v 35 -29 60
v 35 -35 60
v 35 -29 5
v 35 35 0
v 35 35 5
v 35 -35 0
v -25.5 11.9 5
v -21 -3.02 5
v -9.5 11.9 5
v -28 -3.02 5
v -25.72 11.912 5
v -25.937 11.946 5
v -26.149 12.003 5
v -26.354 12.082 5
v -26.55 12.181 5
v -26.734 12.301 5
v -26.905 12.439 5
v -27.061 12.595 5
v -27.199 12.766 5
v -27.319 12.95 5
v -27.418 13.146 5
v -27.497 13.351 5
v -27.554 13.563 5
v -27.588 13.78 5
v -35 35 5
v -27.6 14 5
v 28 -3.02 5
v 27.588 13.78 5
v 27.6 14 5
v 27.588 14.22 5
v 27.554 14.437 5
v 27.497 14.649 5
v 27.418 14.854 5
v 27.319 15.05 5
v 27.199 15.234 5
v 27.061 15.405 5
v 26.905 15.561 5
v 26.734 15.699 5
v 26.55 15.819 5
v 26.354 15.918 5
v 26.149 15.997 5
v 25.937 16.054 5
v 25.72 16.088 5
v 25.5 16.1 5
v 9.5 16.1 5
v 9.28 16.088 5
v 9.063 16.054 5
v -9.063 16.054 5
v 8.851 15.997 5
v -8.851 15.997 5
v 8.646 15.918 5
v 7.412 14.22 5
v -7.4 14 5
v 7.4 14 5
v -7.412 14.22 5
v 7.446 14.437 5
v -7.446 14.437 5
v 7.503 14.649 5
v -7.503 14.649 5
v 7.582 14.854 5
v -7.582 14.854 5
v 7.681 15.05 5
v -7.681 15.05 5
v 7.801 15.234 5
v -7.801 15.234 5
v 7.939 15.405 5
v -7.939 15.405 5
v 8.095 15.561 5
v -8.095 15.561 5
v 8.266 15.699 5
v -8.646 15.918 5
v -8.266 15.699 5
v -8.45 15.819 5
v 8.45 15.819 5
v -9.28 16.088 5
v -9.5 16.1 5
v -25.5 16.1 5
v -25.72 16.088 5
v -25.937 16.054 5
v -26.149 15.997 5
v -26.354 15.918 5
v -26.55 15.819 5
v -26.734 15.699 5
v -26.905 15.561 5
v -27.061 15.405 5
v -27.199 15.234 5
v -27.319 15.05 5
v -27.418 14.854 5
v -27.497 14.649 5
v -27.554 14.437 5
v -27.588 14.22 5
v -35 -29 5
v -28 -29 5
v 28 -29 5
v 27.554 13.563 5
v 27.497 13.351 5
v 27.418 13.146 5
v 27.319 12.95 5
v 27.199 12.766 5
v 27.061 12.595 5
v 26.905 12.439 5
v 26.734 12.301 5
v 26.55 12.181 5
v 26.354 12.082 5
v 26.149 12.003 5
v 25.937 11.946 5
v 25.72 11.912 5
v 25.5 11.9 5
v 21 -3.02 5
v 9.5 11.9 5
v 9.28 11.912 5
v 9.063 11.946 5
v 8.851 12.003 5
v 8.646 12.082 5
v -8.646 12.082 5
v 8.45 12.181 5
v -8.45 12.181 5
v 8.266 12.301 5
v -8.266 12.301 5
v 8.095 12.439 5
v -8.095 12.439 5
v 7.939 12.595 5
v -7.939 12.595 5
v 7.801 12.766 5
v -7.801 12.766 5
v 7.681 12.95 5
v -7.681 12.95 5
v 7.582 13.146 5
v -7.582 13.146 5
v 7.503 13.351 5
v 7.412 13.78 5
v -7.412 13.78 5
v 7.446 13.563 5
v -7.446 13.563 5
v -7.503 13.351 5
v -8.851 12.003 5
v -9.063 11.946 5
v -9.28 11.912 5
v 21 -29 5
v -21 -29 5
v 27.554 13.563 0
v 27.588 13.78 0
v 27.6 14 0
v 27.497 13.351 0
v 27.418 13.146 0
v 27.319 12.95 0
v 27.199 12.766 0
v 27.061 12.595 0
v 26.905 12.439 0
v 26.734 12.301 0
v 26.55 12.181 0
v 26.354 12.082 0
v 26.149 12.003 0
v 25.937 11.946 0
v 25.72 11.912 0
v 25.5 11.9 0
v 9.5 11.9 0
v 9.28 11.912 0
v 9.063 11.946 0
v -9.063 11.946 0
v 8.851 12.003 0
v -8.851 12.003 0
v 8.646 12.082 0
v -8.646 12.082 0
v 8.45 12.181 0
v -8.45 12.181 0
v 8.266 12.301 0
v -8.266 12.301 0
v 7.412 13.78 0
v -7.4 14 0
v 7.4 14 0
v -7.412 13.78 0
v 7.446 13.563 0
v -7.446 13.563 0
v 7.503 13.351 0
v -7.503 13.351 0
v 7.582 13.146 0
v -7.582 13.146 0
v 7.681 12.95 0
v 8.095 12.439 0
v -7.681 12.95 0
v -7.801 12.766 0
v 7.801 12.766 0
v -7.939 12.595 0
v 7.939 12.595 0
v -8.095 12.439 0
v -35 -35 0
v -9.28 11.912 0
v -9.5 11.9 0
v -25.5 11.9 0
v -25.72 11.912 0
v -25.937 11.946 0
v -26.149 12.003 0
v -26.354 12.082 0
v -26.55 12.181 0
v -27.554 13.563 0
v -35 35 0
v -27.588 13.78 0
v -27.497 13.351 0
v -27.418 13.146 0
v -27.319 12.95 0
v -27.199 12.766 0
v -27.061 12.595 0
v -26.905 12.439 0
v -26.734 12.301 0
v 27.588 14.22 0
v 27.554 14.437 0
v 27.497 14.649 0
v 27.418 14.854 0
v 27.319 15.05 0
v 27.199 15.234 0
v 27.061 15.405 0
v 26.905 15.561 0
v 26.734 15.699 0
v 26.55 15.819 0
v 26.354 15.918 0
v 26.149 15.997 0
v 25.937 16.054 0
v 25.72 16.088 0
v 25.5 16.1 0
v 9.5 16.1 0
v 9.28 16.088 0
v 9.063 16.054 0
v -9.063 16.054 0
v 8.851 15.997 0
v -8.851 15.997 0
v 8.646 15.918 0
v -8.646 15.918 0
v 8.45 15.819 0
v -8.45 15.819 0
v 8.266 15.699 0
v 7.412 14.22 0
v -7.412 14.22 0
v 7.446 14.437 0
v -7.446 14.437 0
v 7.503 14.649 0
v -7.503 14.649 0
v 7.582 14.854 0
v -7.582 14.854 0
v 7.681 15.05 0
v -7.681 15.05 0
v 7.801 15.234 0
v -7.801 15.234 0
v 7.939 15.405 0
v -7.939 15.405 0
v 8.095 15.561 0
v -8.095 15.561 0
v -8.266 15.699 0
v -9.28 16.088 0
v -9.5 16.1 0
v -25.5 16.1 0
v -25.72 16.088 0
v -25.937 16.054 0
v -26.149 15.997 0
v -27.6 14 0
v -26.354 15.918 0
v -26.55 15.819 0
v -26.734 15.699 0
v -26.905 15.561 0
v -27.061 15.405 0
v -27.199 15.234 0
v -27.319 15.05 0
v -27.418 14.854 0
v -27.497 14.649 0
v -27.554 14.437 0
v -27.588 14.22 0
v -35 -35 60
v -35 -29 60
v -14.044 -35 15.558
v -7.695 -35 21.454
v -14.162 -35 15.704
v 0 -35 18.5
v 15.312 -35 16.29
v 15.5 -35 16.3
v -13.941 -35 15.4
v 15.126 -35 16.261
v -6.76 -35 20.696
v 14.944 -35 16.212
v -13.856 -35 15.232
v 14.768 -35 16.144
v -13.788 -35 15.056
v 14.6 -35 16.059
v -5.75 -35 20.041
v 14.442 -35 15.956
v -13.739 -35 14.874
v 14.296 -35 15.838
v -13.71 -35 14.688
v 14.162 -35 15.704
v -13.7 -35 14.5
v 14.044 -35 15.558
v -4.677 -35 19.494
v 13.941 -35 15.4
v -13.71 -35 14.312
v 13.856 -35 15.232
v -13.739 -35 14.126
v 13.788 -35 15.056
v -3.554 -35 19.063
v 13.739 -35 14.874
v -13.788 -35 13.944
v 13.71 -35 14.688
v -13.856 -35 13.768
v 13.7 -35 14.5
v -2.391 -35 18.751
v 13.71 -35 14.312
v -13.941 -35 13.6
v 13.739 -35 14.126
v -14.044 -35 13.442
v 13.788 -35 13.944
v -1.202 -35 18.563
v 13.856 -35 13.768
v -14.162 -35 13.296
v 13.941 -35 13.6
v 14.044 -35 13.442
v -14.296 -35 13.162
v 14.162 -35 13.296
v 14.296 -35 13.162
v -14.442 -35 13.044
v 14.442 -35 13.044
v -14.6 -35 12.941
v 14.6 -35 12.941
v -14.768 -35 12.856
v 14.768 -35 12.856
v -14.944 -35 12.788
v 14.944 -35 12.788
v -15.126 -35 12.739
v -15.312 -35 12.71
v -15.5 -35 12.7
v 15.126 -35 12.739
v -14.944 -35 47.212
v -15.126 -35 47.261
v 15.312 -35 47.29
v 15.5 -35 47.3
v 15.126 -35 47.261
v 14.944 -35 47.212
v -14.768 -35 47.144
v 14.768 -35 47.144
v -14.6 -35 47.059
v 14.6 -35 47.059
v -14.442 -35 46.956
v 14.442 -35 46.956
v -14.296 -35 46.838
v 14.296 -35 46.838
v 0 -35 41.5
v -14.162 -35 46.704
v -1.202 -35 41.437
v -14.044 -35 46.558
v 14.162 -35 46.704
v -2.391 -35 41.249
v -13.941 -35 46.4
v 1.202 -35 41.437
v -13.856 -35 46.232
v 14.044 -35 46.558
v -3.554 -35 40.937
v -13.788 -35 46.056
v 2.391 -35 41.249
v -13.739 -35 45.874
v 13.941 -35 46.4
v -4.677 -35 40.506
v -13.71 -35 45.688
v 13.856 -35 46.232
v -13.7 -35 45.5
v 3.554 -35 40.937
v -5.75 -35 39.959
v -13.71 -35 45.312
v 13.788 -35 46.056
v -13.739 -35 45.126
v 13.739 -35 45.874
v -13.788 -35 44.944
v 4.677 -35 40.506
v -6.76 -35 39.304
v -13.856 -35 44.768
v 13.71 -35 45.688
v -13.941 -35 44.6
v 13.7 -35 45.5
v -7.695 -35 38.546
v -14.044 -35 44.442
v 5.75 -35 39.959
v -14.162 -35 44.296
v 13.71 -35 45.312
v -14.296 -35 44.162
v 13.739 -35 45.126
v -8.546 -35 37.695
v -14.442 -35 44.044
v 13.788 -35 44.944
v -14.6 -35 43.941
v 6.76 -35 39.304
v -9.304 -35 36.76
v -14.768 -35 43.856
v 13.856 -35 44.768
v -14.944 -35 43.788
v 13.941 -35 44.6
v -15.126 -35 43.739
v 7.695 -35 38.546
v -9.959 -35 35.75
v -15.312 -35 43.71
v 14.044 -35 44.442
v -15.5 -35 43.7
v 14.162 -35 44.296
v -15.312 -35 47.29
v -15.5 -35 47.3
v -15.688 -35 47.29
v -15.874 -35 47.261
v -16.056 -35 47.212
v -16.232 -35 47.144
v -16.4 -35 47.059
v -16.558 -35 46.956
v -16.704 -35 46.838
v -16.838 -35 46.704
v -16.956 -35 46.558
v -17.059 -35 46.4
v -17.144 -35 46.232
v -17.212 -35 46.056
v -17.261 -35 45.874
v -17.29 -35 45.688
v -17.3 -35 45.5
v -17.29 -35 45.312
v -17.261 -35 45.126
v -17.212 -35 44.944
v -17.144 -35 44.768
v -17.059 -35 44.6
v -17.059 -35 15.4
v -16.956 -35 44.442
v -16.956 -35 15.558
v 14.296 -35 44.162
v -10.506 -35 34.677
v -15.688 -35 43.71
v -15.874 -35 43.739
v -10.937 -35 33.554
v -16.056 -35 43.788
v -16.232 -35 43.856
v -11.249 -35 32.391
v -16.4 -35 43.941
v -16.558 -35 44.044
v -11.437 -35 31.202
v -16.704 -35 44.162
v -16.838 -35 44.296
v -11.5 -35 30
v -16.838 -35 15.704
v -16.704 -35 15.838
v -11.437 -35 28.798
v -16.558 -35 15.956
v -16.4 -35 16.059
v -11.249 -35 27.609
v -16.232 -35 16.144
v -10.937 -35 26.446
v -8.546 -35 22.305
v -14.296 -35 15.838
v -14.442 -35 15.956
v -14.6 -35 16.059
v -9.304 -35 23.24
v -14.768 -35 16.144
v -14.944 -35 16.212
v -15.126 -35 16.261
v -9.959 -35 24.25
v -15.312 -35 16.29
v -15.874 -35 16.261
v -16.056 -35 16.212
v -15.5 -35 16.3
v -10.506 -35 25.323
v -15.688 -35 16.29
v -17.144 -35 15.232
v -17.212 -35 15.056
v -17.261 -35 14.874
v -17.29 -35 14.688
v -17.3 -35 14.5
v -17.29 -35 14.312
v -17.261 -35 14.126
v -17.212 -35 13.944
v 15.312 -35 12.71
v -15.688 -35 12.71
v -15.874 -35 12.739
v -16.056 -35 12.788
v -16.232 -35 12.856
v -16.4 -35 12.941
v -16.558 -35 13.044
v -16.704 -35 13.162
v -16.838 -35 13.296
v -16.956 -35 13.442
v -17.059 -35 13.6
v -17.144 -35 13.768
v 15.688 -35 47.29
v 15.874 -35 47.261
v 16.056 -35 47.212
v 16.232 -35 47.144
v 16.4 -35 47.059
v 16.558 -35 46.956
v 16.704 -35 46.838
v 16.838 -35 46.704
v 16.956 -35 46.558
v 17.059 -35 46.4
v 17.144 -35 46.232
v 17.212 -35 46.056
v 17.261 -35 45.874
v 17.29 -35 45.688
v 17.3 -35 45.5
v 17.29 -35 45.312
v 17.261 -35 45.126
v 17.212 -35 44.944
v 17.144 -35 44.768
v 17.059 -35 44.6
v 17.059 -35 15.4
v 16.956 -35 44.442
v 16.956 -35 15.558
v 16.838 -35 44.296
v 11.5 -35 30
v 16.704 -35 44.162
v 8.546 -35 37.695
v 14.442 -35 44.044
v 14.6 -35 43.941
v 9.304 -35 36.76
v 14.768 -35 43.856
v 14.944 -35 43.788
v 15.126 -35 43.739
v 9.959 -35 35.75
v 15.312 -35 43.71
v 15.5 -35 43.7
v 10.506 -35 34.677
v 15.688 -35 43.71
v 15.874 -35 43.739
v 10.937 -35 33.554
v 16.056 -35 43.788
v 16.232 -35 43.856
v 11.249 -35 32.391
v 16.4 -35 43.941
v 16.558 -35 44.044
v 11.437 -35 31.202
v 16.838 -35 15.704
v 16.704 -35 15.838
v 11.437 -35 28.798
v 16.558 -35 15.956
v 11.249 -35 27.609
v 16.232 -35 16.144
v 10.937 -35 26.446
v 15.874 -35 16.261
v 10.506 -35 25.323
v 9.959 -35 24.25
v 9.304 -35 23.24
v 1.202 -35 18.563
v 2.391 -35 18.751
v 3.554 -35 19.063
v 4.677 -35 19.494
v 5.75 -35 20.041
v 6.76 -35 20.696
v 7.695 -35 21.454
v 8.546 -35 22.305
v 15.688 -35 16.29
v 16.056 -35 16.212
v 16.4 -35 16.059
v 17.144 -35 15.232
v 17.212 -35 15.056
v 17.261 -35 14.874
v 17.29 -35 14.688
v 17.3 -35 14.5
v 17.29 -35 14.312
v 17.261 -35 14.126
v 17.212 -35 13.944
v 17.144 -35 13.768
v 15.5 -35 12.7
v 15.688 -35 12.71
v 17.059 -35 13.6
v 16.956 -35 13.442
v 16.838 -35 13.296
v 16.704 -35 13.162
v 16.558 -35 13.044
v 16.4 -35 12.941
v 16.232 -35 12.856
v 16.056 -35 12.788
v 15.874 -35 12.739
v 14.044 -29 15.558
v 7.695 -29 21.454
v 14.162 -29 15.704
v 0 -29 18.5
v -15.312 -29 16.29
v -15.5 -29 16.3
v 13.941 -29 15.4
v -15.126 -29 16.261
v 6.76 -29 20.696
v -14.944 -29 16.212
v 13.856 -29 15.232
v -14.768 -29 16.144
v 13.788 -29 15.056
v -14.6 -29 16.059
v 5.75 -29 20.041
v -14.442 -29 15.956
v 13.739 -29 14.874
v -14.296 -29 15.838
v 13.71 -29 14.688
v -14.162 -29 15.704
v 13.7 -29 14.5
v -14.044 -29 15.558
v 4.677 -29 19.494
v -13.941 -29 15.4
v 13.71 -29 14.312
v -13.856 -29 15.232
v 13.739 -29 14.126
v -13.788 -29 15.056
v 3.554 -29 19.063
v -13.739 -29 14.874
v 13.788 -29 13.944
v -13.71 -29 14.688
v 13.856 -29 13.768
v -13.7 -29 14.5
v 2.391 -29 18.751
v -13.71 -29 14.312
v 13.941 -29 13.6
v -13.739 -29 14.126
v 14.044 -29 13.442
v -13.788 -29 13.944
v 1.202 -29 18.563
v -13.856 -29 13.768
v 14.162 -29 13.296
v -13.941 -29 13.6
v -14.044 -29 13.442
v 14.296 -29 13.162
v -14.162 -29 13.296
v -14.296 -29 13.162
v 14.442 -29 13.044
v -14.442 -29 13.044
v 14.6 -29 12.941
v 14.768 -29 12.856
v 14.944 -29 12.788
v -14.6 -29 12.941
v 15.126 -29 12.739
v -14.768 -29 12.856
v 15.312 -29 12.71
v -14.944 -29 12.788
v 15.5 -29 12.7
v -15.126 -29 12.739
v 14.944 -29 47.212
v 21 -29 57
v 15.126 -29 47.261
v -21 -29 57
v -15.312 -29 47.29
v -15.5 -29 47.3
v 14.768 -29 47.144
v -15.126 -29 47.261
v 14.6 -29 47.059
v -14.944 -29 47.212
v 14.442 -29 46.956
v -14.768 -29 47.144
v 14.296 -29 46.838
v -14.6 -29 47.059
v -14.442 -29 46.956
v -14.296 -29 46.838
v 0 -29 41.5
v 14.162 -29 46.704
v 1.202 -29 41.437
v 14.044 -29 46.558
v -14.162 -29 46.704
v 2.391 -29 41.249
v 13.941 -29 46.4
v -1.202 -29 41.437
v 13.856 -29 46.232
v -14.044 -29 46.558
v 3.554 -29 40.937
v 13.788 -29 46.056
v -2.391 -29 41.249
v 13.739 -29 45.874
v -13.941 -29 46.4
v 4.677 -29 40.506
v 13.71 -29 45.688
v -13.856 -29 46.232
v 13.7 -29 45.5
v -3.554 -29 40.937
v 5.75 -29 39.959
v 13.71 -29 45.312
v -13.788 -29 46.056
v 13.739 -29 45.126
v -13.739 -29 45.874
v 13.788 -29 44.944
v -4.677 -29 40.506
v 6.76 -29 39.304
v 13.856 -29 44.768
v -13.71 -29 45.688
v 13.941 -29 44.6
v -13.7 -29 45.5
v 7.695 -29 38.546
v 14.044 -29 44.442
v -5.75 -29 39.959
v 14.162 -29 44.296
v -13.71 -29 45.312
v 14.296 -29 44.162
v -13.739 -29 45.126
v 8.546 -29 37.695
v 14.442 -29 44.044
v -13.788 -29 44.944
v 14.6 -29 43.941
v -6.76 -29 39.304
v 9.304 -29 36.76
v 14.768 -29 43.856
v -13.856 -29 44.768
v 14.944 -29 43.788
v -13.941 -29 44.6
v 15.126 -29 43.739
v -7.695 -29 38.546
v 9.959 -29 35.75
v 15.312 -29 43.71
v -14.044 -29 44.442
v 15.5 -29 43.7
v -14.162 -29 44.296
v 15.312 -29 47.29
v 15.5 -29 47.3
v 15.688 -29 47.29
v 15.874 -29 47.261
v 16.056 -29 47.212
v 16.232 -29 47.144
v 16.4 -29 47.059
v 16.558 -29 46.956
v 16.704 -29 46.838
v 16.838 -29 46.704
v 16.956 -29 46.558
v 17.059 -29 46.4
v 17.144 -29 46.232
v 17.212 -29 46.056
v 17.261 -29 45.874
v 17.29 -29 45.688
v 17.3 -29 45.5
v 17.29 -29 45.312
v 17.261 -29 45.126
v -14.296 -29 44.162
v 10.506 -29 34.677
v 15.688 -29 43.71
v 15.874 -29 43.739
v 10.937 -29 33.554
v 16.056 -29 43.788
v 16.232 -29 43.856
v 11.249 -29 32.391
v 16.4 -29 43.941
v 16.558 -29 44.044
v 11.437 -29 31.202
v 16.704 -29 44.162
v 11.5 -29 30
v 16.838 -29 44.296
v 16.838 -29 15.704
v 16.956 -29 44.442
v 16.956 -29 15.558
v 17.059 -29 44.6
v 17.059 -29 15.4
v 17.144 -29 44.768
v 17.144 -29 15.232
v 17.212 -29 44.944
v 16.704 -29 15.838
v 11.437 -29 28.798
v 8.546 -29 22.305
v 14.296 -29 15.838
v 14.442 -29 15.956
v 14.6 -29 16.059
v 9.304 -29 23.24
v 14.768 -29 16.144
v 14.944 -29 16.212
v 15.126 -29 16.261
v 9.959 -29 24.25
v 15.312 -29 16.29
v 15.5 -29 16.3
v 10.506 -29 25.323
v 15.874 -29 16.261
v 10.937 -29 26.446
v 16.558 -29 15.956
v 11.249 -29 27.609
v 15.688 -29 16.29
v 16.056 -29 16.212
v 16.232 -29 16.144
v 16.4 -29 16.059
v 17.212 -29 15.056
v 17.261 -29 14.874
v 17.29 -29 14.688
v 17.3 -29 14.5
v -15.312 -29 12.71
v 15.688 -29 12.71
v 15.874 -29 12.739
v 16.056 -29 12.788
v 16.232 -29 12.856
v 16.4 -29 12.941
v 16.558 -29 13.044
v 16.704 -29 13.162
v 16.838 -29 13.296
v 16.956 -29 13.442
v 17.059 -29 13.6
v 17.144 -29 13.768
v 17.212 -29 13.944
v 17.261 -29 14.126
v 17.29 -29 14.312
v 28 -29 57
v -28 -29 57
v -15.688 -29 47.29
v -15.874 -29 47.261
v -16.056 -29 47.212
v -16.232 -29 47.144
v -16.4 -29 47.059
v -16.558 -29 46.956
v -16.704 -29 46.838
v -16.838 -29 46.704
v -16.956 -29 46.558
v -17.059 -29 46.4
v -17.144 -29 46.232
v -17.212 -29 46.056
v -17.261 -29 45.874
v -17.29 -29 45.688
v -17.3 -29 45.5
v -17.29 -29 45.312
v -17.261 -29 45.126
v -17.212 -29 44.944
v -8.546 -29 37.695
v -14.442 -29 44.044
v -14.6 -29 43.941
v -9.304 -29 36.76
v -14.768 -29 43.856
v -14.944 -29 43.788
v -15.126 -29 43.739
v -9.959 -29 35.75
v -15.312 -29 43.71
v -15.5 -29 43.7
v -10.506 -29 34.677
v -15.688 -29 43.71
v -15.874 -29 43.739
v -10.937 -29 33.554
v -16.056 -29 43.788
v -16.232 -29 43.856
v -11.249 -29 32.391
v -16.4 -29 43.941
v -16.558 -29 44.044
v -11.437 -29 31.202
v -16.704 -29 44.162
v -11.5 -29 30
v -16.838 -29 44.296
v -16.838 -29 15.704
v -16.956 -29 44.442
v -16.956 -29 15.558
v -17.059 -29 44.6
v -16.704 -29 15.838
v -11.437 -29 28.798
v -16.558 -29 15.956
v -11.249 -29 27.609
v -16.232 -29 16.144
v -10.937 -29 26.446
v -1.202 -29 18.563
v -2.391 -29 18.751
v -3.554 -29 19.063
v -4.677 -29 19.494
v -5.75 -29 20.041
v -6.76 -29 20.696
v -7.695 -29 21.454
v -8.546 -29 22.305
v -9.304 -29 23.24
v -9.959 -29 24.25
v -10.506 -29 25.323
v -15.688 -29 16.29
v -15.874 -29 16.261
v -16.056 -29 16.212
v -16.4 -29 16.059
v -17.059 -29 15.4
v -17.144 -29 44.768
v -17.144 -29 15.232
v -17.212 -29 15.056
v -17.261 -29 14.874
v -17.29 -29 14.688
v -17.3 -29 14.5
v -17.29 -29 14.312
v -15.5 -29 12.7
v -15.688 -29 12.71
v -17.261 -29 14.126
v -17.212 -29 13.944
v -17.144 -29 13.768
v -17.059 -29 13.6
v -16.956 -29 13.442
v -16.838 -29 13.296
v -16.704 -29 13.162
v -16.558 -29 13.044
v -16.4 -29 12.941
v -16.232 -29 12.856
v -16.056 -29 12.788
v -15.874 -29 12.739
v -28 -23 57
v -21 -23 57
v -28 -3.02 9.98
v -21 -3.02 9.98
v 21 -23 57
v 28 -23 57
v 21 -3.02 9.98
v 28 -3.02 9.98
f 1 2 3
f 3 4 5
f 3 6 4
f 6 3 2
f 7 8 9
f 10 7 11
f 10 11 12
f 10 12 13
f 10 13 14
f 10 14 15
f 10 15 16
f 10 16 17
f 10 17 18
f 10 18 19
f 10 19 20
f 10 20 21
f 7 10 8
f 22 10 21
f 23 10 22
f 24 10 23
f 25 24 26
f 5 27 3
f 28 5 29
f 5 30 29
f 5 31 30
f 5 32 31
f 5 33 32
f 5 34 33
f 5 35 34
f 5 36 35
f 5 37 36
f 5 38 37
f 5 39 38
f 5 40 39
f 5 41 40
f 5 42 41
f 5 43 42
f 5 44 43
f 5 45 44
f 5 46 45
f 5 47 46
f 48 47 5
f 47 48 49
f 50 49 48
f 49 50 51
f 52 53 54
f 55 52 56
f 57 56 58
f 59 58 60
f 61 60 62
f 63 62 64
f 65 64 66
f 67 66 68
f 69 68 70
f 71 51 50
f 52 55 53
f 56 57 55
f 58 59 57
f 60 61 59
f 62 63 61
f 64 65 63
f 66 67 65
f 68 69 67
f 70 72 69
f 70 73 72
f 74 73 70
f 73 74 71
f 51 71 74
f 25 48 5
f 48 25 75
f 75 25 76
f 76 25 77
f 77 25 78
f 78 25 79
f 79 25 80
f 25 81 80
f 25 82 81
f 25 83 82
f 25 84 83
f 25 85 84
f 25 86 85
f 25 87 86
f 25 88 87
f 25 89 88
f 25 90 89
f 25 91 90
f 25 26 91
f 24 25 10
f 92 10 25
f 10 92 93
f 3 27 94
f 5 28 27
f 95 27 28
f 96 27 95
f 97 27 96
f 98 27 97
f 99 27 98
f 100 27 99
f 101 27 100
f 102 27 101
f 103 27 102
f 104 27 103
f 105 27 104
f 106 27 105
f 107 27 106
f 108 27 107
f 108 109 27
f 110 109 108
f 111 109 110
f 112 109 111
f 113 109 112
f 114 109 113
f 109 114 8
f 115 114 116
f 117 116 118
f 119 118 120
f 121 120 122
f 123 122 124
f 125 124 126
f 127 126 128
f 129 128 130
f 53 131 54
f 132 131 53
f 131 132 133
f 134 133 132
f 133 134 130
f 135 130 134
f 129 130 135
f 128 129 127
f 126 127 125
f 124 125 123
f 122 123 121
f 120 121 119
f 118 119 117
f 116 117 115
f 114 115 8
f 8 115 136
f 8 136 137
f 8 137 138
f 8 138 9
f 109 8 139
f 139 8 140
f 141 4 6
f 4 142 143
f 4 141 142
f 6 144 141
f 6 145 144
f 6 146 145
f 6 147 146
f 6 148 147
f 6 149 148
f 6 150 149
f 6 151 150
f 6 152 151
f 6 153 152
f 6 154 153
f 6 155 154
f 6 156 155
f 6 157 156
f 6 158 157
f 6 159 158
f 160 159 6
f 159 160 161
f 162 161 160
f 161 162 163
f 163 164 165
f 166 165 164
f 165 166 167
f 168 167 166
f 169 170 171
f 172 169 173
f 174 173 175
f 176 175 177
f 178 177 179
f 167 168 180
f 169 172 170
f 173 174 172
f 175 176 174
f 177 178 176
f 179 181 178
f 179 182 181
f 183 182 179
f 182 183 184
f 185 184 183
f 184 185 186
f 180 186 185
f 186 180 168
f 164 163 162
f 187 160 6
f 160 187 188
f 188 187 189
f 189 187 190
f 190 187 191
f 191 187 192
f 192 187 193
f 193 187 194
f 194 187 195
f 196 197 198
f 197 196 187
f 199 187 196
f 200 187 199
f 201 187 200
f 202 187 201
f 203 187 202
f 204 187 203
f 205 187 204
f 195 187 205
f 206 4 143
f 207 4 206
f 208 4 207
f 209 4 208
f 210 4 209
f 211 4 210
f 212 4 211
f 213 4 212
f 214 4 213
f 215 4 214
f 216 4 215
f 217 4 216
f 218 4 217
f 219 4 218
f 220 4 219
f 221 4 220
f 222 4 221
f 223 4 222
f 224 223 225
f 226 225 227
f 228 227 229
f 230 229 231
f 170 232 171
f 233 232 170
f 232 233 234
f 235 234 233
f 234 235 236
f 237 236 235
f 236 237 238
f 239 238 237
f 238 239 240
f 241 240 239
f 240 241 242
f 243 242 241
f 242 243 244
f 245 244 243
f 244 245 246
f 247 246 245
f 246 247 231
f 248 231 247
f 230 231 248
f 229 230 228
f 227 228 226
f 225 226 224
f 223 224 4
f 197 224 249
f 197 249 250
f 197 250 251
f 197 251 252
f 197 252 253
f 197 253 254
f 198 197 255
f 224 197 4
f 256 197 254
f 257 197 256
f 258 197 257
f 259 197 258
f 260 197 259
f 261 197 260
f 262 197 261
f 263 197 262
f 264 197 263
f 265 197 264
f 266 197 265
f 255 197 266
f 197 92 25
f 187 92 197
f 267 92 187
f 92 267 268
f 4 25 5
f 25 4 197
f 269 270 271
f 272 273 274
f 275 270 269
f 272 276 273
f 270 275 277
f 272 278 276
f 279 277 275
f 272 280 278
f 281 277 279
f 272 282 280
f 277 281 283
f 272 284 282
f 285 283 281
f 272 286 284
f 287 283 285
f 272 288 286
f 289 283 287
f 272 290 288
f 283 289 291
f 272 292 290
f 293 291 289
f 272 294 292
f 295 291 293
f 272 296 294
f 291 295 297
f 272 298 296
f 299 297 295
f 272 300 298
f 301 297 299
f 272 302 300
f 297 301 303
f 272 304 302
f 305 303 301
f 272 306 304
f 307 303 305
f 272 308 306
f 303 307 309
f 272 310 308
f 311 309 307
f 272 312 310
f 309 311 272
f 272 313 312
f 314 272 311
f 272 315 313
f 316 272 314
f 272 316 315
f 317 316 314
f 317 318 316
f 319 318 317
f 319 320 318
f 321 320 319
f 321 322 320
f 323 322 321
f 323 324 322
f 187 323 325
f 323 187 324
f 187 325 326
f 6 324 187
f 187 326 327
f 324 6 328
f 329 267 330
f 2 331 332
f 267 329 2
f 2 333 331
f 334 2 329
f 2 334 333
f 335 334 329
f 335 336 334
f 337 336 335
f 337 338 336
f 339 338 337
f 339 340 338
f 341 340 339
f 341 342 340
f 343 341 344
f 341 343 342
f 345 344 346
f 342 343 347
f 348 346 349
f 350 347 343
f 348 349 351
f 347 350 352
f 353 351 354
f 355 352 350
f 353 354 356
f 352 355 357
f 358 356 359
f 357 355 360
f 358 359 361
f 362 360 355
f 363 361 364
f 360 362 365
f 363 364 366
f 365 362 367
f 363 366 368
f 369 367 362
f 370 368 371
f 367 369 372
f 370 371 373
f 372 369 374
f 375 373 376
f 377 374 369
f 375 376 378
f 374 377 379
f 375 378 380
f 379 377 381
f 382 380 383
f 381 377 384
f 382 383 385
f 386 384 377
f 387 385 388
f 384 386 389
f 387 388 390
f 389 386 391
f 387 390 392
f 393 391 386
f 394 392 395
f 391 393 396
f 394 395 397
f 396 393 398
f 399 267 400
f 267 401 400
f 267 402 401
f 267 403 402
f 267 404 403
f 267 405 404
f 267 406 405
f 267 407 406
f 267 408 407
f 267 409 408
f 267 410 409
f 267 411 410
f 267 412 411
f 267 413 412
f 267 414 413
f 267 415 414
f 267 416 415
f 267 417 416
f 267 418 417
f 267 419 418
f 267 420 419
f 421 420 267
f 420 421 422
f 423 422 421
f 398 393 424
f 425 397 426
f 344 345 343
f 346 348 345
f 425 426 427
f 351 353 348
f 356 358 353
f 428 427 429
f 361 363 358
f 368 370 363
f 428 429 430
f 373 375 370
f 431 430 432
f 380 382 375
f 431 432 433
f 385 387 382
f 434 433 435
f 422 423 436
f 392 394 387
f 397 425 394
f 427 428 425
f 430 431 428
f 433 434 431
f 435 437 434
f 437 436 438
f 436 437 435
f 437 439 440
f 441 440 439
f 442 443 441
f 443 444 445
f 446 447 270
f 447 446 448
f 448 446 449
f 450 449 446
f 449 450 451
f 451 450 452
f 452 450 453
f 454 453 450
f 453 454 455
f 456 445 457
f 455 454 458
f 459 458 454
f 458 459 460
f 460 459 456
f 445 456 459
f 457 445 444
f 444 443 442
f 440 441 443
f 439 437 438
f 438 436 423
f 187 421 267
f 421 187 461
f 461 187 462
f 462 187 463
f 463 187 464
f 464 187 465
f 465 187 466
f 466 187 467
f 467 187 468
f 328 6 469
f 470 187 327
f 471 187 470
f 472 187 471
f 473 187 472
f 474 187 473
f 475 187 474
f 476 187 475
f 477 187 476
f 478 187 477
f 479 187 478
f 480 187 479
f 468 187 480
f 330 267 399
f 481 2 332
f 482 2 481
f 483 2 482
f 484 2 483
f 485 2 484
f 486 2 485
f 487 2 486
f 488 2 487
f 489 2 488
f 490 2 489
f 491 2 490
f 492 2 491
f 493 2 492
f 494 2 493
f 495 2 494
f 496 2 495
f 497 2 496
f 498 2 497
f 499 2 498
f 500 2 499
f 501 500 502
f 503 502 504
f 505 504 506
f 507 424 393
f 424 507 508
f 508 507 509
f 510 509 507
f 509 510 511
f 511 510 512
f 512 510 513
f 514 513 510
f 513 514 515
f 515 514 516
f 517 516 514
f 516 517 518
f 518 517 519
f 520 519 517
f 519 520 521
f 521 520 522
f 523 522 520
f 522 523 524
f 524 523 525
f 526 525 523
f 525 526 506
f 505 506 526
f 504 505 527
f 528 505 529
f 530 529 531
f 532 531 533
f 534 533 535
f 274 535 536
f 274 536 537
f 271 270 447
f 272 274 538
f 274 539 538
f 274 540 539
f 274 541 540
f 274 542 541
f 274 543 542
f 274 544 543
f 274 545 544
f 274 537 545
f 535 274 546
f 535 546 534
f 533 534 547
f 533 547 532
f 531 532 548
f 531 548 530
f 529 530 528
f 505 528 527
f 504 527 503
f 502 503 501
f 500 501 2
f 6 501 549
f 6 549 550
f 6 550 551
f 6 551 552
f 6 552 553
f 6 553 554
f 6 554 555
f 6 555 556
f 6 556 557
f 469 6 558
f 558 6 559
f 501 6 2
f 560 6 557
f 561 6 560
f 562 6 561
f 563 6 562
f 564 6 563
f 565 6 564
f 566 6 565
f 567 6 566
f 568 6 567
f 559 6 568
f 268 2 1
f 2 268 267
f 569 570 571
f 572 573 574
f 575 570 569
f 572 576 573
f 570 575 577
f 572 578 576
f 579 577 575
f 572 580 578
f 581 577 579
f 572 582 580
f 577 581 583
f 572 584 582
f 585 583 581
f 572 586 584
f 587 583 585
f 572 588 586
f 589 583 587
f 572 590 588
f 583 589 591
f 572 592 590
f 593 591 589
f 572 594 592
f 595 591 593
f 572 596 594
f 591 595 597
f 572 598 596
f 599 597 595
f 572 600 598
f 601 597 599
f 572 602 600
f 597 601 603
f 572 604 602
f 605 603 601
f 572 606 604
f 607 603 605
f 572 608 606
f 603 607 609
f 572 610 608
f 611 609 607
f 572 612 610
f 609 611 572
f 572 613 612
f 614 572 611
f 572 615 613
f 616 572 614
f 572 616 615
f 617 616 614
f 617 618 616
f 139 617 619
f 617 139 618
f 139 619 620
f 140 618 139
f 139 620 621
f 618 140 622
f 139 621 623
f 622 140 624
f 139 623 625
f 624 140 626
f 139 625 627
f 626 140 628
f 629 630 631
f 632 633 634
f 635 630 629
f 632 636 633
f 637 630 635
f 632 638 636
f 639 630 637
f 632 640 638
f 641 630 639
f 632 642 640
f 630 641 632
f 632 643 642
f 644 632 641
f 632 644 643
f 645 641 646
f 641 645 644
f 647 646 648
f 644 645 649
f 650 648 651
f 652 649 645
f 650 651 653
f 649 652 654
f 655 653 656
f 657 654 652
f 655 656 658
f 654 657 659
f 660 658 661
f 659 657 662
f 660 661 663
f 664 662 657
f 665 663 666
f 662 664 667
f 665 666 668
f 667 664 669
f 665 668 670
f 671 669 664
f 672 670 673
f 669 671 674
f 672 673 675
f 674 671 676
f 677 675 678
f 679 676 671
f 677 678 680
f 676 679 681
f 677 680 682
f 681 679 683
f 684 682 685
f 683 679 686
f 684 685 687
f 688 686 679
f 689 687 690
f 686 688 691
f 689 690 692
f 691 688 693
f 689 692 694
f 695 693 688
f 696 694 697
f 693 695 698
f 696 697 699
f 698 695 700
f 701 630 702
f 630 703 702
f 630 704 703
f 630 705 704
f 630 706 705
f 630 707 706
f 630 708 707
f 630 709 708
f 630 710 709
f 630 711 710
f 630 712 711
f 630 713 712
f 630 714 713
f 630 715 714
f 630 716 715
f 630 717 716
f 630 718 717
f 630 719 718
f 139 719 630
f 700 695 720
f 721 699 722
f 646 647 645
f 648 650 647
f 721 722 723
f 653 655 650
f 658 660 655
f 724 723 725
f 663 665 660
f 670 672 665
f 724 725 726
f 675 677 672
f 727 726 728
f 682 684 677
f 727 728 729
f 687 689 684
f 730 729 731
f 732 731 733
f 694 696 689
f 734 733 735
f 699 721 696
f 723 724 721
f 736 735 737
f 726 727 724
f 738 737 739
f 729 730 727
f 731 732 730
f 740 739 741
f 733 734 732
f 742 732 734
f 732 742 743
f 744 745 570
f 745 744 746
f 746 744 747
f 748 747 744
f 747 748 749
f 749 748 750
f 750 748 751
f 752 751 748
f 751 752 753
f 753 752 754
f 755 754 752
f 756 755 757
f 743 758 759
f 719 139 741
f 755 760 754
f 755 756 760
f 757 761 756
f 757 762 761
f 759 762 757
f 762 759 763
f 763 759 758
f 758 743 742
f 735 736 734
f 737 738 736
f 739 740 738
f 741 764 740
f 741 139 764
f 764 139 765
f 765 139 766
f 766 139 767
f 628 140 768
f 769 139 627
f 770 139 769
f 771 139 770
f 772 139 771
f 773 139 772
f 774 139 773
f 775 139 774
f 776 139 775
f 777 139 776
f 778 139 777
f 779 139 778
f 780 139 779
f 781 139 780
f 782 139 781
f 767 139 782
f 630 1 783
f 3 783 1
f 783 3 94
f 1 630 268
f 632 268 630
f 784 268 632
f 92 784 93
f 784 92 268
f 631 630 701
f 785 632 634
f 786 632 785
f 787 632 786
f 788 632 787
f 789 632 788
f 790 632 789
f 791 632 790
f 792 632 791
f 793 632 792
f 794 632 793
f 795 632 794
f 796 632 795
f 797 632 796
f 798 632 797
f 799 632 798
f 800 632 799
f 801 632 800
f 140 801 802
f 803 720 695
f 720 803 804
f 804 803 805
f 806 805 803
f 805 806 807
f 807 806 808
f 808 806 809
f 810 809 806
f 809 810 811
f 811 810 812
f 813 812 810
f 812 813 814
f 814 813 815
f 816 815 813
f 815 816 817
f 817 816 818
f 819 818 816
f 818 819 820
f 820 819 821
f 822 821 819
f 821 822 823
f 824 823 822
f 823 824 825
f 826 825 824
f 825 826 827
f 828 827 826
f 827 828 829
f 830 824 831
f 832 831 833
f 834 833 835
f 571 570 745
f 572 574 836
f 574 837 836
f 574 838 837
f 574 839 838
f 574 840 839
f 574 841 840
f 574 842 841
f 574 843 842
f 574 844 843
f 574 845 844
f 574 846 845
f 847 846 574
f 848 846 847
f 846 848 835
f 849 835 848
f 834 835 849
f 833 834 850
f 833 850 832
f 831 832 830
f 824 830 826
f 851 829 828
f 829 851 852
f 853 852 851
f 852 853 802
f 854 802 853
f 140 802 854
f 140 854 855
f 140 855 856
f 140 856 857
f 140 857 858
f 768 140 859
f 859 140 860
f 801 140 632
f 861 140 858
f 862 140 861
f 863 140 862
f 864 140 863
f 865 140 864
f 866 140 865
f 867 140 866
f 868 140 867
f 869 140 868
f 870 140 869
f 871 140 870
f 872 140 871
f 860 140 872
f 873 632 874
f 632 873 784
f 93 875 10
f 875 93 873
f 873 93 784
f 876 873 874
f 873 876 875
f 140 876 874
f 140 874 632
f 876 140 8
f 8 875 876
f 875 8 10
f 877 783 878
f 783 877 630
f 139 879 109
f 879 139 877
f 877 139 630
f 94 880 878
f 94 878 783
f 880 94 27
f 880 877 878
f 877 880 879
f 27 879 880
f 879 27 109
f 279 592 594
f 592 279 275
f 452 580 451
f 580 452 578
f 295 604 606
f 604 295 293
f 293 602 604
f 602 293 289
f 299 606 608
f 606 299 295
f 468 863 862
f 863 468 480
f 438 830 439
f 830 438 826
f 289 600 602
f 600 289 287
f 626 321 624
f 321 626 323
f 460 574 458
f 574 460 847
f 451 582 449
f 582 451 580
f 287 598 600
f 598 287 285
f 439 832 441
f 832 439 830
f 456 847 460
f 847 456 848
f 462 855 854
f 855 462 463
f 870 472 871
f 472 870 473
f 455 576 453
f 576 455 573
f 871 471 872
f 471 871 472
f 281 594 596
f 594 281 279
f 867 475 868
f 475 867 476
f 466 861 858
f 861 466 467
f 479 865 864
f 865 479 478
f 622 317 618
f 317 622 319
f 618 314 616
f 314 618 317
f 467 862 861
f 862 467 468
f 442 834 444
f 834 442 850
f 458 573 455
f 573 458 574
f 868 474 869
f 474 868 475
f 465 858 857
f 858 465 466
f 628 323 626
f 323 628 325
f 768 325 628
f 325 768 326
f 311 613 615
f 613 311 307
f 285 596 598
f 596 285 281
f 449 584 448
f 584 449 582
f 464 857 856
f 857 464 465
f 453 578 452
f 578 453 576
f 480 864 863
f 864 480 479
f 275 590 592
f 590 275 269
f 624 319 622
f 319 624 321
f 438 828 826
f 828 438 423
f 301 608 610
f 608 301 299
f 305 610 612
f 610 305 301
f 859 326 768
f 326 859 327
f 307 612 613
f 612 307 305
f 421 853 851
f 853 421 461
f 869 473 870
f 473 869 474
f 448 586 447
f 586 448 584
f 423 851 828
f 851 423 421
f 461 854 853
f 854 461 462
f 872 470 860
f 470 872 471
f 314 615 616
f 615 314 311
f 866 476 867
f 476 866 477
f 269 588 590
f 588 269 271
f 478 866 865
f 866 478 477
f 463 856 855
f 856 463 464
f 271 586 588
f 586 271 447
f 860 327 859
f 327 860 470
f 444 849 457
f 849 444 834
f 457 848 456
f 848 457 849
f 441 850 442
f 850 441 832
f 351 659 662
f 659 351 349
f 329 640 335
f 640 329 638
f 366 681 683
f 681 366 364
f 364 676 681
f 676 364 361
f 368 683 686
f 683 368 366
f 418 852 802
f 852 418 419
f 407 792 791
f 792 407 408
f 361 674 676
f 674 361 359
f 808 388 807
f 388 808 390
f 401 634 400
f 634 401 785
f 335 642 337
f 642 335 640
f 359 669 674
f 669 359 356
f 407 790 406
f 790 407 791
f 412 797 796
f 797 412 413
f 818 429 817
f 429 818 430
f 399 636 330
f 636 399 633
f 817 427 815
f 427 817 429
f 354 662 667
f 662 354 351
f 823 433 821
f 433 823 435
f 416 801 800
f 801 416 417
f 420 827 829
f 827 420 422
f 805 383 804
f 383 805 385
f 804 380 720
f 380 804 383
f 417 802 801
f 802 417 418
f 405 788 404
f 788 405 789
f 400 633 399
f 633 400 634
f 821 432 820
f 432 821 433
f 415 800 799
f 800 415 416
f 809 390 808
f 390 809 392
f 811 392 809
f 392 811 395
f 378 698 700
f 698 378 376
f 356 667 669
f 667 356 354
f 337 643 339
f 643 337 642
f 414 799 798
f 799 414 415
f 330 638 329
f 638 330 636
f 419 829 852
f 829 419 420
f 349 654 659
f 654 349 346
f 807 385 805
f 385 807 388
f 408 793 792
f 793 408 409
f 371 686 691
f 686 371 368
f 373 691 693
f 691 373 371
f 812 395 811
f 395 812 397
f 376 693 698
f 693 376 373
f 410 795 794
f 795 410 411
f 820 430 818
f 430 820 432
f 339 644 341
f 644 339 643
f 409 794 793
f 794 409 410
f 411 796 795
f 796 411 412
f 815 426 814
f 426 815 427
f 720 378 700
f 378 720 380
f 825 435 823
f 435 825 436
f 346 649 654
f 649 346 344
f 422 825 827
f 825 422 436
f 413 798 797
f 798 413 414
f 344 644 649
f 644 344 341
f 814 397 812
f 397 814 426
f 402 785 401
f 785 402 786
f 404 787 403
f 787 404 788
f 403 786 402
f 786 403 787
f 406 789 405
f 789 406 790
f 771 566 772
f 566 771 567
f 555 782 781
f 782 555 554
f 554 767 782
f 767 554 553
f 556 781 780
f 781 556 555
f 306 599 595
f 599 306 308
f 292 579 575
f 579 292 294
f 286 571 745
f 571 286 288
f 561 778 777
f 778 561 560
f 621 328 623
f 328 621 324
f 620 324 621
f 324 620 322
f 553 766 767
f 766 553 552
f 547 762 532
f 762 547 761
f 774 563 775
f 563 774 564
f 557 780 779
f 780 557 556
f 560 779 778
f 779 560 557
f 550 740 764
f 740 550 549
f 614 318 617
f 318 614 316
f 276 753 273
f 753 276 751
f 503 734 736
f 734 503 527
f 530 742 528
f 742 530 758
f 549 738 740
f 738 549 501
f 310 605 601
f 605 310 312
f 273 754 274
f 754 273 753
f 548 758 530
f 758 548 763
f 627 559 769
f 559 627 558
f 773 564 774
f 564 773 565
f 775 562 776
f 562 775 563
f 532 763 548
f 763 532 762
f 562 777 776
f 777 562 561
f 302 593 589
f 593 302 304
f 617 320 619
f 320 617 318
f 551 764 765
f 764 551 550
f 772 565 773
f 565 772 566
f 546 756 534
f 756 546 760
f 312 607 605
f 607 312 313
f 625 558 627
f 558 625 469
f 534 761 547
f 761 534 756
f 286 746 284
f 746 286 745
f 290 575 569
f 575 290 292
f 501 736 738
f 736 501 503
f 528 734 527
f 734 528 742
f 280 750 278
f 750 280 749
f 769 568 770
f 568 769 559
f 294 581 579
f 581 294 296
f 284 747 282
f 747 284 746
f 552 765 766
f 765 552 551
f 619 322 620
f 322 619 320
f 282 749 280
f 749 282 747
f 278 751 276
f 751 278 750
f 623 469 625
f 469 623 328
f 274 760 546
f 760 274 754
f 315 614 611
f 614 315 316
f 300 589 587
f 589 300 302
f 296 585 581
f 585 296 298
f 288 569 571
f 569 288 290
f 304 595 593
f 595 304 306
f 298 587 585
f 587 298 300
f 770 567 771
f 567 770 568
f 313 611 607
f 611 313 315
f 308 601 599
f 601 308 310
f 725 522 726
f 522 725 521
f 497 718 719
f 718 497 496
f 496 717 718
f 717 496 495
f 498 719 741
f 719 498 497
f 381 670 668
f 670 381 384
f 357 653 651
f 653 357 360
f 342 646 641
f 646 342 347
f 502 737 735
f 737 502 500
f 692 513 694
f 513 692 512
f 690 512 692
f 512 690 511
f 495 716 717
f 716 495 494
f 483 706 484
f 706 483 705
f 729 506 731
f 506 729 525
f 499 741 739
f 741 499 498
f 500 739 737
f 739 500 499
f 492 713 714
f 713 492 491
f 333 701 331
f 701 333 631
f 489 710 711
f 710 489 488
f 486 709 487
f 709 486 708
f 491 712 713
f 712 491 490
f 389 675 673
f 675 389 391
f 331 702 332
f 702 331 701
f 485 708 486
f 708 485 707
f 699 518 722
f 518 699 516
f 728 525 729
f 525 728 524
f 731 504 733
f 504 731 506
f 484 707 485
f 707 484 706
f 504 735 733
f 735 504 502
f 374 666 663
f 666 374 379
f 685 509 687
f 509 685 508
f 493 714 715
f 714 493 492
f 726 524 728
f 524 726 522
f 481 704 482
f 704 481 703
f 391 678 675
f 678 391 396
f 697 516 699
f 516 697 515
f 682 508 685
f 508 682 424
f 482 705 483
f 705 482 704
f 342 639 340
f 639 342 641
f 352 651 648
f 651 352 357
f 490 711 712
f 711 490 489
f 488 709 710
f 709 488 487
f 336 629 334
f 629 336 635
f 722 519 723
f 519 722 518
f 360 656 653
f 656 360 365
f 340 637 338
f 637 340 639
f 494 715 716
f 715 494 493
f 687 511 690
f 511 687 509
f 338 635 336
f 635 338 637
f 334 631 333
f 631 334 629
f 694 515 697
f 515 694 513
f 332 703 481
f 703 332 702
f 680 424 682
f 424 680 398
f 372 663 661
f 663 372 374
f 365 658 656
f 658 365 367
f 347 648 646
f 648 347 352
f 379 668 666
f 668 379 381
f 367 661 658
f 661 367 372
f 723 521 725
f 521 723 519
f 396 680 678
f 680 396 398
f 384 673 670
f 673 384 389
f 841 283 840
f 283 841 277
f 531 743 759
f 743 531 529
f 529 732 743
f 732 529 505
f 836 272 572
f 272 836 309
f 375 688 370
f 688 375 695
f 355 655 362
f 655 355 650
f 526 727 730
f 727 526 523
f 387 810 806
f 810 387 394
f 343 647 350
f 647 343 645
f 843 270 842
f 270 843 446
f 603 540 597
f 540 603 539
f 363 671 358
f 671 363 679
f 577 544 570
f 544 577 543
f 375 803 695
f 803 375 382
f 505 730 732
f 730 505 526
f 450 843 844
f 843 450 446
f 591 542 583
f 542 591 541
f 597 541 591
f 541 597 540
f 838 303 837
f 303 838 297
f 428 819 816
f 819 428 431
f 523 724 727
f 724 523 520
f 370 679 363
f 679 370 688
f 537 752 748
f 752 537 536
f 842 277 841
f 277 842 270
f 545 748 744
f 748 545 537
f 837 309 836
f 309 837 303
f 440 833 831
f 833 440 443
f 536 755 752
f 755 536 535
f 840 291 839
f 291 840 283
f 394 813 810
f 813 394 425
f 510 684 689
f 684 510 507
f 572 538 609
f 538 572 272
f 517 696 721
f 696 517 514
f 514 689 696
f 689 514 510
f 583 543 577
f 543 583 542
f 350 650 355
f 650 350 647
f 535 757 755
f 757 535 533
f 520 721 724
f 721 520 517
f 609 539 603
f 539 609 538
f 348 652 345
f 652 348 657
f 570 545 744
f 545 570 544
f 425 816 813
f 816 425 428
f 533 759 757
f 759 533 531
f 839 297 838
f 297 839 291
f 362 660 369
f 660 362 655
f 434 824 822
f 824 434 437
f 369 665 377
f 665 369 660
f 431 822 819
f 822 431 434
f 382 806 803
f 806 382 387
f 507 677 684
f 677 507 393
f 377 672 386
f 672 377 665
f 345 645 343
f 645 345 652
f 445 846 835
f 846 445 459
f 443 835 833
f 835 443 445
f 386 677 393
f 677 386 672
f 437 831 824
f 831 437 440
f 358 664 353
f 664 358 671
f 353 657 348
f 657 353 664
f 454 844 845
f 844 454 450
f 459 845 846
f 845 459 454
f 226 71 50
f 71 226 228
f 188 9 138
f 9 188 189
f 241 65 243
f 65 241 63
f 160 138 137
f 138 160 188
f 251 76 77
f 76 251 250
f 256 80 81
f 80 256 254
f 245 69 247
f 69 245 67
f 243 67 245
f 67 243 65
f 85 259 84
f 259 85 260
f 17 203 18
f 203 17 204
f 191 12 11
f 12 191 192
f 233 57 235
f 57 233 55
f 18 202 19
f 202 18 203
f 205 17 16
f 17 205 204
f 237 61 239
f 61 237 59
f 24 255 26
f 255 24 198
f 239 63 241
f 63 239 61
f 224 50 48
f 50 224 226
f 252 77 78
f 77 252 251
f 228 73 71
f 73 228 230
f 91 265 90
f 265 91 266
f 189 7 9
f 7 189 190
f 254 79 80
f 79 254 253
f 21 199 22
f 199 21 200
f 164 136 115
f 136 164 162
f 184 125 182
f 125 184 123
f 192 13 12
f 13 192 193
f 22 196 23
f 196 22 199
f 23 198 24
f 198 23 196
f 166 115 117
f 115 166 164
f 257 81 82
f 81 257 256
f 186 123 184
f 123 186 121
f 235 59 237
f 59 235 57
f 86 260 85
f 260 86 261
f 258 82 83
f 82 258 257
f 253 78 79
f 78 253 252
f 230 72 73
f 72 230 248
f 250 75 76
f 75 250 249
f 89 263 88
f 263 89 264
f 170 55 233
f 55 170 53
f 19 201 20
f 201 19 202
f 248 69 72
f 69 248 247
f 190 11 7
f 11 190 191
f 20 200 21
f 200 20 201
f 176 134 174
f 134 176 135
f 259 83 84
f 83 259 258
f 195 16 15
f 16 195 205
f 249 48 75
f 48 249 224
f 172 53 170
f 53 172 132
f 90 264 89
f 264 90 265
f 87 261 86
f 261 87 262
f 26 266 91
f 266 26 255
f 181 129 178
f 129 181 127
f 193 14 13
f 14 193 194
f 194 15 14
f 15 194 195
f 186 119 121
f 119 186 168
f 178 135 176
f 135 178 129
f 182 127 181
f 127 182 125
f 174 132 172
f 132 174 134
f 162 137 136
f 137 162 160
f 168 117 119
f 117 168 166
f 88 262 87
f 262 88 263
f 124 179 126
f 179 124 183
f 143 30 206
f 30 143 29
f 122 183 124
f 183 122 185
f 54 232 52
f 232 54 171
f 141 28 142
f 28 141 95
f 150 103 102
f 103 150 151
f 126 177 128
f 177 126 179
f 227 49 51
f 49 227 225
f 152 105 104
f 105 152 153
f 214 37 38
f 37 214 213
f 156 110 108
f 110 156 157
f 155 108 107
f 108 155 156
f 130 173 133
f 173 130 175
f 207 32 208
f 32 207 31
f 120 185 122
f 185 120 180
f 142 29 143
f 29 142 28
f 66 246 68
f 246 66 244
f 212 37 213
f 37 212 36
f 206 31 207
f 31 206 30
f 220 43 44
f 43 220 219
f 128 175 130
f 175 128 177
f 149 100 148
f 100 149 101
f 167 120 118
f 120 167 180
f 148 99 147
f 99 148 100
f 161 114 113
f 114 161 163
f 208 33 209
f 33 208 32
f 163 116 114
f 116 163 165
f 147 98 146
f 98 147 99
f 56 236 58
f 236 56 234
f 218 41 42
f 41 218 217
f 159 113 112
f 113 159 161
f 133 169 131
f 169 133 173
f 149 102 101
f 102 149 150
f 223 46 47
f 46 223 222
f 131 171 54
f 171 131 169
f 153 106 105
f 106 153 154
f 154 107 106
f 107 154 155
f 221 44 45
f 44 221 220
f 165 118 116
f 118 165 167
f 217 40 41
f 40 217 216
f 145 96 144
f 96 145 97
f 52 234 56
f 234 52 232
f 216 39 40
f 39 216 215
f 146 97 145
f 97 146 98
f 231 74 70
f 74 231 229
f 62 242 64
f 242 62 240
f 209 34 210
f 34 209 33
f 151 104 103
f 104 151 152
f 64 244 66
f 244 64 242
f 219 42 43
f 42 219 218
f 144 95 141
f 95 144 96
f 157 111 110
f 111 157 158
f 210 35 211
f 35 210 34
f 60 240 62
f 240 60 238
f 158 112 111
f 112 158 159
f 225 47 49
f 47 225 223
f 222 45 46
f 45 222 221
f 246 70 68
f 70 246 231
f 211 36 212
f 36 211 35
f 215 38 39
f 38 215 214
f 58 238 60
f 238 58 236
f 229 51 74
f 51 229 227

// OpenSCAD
// NEMA 17 L tension bracket
// Rigid NEMA 17 L bracket with two overlapping hull gussets and tension slots.
$fn = 60;
eps = 0.02;
base_w = 70;
base_d = 70;
base_t = 5;
upright_t = 6;
upright_h = 60;
nema_pitch = 31;
center_clearance_d = 23;
motor_mount_d = 3.6;
slot_length = 16;
slot_d = 4.2;
gusset_w = 7;
gusset_run = 26;

module base_slot(x, y) {
    hull() {
        translate([x - slot_length / 2, y, -eps]) cylinder(d = slot_d, h = base_t + 2 * eps);
        translate([x + slot_length / 2, y, -eps]) cylinder(d = slot_d, h = base_t + 2 * eps);
    }
}

module gusset(x) {
    hull() {
        translate([x, -base_d / 2 + upright_t - eps, base_t - eps])
            cube([gusset_w, gusset_run, base_t]);
        translate([x, -base_d / 2 + upright_t - eps, upright_h - 8])
            cube([gusset_w, upright_t + eps, base_t]);
    }
}

difference() {
    union() {
        translate([-base_w / 2, -base_d / 2, 0]) cube([base_w, base_d, base_t]);
        translate([-base_w / 2, -base_d / 2, 0]) cube([base_w, upright_t, upright_h]);
        gusset(-base_w / 2 + 7);
        gusset(base_w / 2 - 14);
    }
    translate([0, -base_d / 2 - eps, upright_h / 2])
        rotate([-90, 0, 0]) cylinder(d = center_clearance_d, h = upright_t + 2 * eps);
    for (x = [-nema_pitch / 2, nema_pitch / 2], z = [-nema_pitch / 2, nema_pitch / 2])
        translate([x, -base_d / 2 - eps, upright_h / 2 + z])
            rotate([-90, 0, 0]) cylinder(d = motor_mount_d, h = upright_t + 2 * eps);
    base_slot(-base_w / 4, 14);
    base_slot(base_w / 4, 14);
}
